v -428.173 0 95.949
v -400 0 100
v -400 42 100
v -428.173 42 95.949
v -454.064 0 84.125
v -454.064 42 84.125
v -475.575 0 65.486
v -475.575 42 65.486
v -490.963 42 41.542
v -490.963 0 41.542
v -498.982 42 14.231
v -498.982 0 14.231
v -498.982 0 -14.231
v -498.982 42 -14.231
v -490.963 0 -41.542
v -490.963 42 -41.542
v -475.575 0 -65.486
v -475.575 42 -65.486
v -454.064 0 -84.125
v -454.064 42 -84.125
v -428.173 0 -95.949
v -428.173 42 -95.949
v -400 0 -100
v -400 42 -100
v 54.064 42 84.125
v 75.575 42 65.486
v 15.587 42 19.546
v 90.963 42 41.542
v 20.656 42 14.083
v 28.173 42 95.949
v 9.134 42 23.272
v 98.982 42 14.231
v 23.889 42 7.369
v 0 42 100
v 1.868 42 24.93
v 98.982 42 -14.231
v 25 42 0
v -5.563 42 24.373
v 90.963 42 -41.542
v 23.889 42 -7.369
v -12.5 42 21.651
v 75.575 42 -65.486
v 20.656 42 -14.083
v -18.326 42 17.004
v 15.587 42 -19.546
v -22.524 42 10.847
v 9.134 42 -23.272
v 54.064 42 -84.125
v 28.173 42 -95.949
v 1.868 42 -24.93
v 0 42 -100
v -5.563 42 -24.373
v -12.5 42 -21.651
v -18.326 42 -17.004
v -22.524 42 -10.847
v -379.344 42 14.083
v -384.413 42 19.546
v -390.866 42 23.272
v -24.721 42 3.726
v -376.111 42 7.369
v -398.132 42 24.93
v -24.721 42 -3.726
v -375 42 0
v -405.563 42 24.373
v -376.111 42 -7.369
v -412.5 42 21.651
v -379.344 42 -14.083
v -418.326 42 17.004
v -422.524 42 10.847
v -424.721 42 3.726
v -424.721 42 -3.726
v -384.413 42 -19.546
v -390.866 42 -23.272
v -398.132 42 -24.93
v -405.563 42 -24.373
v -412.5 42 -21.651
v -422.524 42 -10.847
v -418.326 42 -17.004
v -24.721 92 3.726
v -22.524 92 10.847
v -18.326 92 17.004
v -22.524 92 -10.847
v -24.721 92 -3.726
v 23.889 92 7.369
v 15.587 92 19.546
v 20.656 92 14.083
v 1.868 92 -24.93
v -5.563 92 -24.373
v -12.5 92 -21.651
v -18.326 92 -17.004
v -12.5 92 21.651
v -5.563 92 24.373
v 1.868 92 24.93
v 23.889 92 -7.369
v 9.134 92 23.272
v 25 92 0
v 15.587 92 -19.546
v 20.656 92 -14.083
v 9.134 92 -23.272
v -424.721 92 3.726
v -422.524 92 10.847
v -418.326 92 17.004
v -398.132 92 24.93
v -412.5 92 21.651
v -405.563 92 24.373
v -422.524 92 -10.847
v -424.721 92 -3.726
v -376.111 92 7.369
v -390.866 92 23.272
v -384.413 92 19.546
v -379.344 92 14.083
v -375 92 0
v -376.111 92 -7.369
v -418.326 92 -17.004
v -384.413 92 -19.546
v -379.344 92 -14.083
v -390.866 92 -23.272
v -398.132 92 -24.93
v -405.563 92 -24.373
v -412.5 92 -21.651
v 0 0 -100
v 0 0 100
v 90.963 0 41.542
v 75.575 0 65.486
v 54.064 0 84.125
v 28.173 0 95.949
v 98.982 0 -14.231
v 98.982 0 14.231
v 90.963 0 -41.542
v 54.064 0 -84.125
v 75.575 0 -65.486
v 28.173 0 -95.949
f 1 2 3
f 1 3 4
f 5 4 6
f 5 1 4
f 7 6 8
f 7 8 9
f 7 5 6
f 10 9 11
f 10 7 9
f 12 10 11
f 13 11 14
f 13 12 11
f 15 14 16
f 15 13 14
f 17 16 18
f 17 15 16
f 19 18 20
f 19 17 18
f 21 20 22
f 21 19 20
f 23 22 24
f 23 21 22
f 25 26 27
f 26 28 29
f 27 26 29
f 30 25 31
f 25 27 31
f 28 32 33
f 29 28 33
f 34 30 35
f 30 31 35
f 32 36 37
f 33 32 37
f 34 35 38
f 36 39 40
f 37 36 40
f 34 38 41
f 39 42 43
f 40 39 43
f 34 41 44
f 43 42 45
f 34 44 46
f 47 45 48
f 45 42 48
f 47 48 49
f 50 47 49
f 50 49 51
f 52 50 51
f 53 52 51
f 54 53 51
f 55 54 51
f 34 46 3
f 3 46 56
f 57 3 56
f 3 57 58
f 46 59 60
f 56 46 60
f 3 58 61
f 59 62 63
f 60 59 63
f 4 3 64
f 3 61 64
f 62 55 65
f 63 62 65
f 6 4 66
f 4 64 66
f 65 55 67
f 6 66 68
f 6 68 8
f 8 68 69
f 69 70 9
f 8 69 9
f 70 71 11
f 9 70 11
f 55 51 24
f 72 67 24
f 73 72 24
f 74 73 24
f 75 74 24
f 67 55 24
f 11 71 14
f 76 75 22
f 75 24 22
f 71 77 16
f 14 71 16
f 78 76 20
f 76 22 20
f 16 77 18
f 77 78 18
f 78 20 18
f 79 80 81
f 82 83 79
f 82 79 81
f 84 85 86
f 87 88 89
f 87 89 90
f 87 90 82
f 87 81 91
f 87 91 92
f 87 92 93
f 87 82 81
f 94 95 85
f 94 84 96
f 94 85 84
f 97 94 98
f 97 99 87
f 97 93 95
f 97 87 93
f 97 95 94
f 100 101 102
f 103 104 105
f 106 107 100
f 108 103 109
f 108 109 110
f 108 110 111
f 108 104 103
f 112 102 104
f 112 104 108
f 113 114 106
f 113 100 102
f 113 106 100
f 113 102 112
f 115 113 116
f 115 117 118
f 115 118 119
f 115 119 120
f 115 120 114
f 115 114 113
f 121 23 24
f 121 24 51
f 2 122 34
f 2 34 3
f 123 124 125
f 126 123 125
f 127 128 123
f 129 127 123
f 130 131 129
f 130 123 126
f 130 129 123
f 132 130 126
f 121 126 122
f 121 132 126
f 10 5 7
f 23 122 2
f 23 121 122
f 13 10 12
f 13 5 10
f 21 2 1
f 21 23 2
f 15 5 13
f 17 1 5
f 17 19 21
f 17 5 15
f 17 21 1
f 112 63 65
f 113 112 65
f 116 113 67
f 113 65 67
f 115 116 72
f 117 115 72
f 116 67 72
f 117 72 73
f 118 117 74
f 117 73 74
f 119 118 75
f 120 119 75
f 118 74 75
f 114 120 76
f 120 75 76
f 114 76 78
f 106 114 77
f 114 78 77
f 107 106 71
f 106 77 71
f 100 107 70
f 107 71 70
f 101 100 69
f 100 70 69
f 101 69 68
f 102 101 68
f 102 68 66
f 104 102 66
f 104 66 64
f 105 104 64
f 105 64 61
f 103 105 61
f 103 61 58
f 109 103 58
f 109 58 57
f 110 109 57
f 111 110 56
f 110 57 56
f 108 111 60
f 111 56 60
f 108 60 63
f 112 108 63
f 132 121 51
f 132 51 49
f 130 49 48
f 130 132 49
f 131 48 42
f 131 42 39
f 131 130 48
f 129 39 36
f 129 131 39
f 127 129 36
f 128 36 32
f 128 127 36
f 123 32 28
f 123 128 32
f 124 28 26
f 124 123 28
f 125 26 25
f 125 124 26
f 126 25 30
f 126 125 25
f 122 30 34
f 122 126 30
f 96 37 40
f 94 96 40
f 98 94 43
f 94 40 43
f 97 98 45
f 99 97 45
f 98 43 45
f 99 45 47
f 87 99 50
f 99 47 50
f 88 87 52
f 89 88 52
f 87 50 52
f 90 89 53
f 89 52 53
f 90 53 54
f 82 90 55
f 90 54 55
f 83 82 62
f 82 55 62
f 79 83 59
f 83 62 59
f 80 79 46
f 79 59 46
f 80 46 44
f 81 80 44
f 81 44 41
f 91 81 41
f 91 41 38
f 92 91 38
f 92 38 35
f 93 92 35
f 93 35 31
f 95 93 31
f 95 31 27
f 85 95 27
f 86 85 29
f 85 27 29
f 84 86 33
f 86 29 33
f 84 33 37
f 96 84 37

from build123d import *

# Parameters (mm, degrees)
BOSS_EXTRUDE1_DEPTH = 42
SKETCH3_R           = 25
BOSS_EXTRUDE2_DEPTH = 50
SKETCH4_R           = 25
BOSS_EXTRUDE3_DEPTH = 50


with BuildPart() as part:
    # Sketch2 → Boss-Extrude1 (new body)
    with BuildSketch(Plane(origin=(0, 0, 0), x_dir=(1, 0, 0), z_dir=(0, 1, 0))):
        with BuildLine():
            Line((0, -100), (-400, -100))
            ThreePointArc((-400, -100), (-500, 0), (-400, 100))
            Line((-400, 100), (0, 100))
            ThreePointArc((0, 100), (100, 0), (0, -100))
        make_face()
    extrude(amount=BOSS_EXTRUDE1_DEPTH)

    # Sketch3 → Boss-Extrude2 (add)
    with BuildSketch(Plane(origin=(0, 42, 0), x_dir=(1, 0, 0), z_dir=(0, 1, 0))):
        Circle(SKETCH3_R)
    extrude(amount=BOSS_EXTRUDE2_DEPTH)

    # Sketch4 → Boss-Extrude3 (add)
    with BuildSketch(Plane(origin=(0, 42, 0), x_dir=(1, 0, 0), z_dir=(0, 1, 0))):
        with Locations((-400, 0)):
            Circle(SKETCH4_R)
    extrude(amount=BOSS_EXTRUDE3_DEPTH)


solid = part.part
